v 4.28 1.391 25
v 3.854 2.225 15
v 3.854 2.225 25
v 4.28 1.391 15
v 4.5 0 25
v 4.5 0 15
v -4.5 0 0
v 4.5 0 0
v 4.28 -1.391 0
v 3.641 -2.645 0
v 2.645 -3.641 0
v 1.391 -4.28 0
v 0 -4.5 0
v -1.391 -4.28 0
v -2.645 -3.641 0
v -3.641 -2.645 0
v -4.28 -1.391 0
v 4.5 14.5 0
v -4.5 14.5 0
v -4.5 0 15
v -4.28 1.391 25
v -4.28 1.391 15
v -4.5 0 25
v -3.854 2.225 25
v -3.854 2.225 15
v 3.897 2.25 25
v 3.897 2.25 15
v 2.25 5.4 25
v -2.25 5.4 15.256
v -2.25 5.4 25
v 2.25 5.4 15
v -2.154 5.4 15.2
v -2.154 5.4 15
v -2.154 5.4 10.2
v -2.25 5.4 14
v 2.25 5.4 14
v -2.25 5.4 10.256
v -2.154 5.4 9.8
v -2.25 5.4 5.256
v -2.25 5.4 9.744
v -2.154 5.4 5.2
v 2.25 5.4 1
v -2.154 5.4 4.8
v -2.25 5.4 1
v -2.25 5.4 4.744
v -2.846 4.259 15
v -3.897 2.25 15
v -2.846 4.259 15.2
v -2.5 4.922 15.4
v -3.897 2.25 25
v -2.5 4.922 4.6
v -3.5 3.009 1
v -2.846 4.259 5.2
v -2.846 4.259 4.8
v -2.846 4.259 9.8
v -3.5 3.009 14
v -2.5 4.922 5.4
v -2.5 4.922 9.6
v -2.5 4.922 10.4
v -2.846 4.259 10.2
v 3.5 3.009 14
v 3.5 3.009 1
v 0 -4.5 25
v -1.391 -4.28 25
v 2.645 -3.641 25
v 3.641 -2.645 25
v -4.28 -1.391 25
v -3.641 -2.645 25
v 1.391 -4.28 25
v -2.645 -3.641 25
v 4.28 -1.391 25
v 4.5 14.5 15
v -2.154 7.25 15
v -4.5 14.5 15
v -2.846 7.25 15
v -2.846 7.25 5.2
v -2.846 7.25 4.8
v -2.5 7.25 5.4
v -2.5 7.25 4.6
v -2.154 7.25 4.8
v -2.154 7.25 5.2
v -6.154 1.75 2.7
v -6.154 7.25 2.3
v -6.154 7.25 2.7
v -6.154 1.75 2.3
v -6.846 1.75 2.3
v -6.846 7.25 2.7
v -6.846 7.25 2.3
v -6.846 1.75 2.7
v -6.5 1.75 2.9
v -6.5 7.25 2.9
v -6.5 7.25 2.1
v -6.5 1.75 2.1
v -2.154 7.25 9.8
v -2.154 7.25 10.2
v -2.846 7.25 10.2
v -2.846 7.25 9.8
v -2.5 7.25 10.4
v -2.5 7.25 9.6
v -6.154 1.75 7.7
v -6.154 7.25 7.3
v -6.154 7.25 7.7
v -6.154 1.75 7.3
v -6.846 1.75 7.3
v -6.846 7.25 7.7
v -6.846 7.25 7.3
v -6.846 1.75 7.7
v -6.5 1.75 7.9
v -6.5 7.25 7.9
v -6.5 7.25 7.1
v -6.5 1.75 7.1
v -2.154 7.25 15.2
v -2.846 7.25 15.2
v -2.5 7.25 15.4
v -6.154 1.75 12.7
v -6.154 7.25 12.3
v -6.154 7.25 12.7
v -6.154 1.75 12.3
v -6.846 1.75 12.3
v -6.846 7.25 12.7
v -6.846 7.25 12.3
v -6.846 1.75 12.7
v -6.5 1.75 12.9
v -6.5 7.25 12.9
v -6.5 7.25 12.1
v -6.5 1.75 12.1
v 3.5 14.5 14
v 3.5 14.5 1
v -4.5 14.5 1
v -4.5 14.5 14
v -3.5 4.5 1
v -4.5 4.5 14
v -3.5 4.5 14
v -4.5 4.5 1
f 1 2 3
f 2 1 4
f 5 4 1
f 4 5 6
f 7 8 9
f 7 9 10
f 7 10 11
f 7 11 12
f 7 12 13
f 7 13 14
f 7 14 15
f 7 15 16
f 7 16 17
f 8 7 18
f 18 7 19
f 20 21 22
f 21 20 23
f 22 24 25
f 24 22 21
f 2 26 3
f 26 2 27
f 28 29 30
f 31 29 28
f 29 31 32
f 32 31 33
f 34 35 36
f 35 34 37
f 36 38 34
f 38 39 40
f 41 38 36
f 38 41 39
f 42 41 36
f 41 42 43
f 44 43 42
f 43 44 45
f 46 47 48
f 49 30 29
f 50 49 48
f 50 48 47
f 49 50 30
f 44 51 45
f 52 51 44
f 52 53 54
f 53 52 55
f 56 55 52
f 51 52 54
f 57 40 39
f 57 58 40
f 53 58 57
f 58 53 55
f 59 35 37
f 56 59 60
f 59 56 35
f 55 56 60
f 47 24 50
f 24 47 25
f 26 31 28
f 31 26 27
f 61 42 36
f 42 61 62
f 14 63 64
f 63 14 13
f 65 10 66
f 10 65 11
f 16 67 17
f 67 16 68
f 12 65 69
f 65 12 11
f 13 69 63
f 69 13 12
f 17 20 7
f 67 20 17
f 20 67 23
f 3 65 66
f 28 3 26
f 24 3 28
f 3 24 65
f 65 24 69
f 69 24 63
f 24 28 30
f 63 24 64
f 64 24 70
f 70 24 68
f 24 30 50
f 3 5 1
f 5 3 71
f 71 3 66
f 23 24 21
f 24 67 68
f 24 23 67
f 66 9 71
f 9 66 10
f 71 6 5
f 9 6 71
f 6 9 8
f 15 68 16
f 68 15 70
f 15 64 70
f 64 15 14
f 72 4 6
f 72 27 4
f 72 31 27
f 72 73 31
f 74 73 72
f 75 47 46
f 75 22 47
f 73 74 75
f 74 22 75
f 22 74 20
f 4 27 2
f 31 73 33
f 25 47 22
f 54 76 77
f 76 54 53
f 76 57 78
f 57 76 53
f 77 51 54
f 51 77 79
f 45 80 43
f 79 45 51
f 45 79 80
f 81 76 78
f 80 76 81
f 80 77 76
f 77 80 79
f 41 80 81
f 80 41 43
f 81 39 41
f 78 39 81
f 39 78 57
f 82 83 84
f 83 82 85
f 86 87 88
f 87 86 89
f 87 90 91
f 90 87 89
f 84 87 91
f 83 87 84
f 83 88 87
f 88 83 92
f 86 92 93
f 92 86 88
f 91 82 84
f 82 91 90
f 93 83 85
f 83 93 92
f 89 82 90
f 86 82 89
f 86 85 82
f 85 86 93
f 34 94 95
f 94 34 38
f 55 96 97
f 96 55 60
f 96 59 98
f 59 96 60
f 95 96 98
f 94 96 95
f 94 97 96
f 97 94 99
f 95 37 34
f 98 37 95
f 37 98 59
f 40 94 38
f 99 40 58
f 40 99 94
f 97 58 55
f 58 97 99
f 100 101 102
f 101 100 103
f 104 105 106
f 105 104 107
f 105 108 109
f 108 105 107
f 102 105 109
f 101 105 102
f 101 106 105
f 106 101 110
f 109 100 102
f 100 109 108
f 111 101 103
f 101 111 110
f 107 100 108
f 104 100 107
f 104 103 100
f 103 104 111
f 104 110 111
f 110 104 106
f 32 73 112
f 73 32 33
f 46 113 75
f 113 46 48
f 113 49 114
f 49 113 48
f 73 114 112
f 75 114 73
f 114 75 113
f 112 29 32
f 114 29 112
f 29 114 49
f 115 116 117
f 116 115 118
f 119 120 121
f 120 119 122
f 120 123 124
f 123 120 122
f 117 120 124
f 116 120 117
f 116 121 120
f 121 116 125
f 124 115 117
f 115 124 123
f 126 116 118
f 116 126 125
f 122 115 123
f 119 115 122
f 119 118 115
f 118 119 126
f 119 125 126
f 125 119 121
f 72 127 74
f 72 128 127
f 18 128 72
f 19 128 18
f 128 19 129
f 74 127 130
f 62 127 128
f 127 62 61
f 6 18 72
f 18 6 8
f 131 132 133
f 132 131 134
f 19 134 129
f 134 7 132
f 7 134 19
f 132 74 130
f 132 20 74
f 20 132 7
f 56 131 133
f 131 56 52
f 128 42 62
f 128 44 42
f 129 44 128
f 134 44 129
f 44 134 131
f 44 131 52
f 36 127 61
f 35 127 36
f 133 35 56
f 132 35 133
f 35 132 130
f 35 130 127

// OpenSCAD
teardropcentering2();
padded_teardrop();

module teardrop (r=4.5,h=20, r_mult=1)
{
	union(){
		cylinder(r=r, h=h, $fn=20);
		teardrop_poly(r=r, h=h, r_mult=r_mult);
	}
}

module teardrop_poly (r=4.5,h=20, r_mult=1.2)
{
	linear_extrude(height=h)
	{
		polygon(points=[[0,0],[r*cos(30),r*sin(30)],[0.5*r,r_mult*r],[-0.5*r,r_mult*r],[-r*cos(30),r*sin(30)]],
				paths=[[0,1,2,3,4]]);
	}
}

module teardropcentering (r=4.5,h=20)
{
    {
		teardrop(r=r, h=h, r_mult=1.2);
	}
}

module teardropcentering2 (r=4.5,h=20)
{
	difference(){
        teardrop(r=r, h=h, r_mult=1.2);
	translate(v = [-1.5*r, -1.5*r,-1])cube(size =[3*r,1.5*r,h+2]);
	}
}

module padded_teardrop(r = 4, h = 15, diameter_adjust = 0.5, internal_offset = 0, pressure_pad_height_ratio=0.325, add_strenght = 1, cut_spacing = 5, cut_h=5.5, magic = 10, cut_width=1)
{

	//r is real radius, as measured on steel.
    // (real object has radius bigger by diameter_adjust
	//h is lenght of pressure pad, including cutouts.
	// (Real object has teardrop part enlarged by
    // magic number to positive direction and by internal_offset to negative direcion

	// you should not have to change to change latter
	//diameter_adjust is here due to wall width, or something like this.
	//pressure_pad_height_ratio is how far the pressure pad sticks into the rod hole

	//add_strenght enables 'cuts' to trick skeinforge into putting more plastic
	//  into pressure pad, greatly strenghtening it.
	//  set to 1 for cylindrical, 2 for slot cuts.
	//cut_spacing is distance between cuts. for cylindrical cuts every odd cut
	//  is offset by cut_spacing/2
	// cut_h is height of cuts, you should be able to fine tune it so it begins in object layer 2
	//magic is here to assure that when substracting we get out of the object
    //cut_width is distande between pressure pad and object

	//always substract just from nearest wrapping object

	difference(){
		//axe hole
        translate([0, 0, -internal_offset])
		  teardropcentering((r+diameter_adjust), h+magic+internal_offset);
		//pressure pad
		rotate([0,-90,90])
		translate([
			0,
			-(r+diameter_adjust),
			(-(r+diameter_adjust))-(r-(r*pressure_pad_height_ratio))-magic
			])
			cube(size = [
				h,
				(r+diameter_adjust)*2,(r+diameter_adjust)+magic]);
	}
	rotate([0,-90,90]) {
		//cutting along the axis
		//this one goes thru
		translate(v = [0, -(r+diameter_adjust), -(r+diameter_adjust)-magic])
			cube(size = [h,cut_width,(r+diameter_adjust)+magic]);
		//this one does not
		translate(v = [0, (r+diameter_adjust)-cut_width, -(r+diameter_adjust)])
			cube(size = [h,cut_width,(r+diameter_adjust)]);
		//cuts across axis, both go thru
		translate(v = [0, -(r+diameter_adjust), -(r+diameter_adjust)-magic])
			cube(size = [cut_width,(r+diameter_adjust)*2,(r+diameter_adjust)+magic]);
		translate(v = [h-cut_width, -(r+diameter_adjust), -(r+diameter_adjust)-magic])
			cube(size = [cut_width,(r+diameter_adjust)*2,(r+diameter_adjust)+magic]);

		if(add_strenght==1){
			//cylinder cut
			translate([cut_spacing,0,0]) {
				for (i=[1:h/cut_spacing]){
					translate(v = [(i-1)*cut_spacing, (r+diameter_adjust)-r/2, -(r+diameter_adjust)])
						cylinder(h = cut_h, r=0.4, $fn=6, center=true);
					translate(v = [(i-1)*cut_spacing- (cut_spacing/2) , (r+diameter_adjust)+r/2, -(r+diameter_adjust)])
						cylinder(h = cut_h, r=0.4, $fn=6, center=true);
				}
			}
		} 
		if (add_strenght == 2){
			//slot cut
			for (i=[1:h/cut_spacing]){
				translate(v = [i*cut_spacing, (r+diameter_adjust)-r/2, -(r+diameter_adjust)-cut_h/2])
					cube([0.4,r,cut_h]); 
			}
		}
	}
}
